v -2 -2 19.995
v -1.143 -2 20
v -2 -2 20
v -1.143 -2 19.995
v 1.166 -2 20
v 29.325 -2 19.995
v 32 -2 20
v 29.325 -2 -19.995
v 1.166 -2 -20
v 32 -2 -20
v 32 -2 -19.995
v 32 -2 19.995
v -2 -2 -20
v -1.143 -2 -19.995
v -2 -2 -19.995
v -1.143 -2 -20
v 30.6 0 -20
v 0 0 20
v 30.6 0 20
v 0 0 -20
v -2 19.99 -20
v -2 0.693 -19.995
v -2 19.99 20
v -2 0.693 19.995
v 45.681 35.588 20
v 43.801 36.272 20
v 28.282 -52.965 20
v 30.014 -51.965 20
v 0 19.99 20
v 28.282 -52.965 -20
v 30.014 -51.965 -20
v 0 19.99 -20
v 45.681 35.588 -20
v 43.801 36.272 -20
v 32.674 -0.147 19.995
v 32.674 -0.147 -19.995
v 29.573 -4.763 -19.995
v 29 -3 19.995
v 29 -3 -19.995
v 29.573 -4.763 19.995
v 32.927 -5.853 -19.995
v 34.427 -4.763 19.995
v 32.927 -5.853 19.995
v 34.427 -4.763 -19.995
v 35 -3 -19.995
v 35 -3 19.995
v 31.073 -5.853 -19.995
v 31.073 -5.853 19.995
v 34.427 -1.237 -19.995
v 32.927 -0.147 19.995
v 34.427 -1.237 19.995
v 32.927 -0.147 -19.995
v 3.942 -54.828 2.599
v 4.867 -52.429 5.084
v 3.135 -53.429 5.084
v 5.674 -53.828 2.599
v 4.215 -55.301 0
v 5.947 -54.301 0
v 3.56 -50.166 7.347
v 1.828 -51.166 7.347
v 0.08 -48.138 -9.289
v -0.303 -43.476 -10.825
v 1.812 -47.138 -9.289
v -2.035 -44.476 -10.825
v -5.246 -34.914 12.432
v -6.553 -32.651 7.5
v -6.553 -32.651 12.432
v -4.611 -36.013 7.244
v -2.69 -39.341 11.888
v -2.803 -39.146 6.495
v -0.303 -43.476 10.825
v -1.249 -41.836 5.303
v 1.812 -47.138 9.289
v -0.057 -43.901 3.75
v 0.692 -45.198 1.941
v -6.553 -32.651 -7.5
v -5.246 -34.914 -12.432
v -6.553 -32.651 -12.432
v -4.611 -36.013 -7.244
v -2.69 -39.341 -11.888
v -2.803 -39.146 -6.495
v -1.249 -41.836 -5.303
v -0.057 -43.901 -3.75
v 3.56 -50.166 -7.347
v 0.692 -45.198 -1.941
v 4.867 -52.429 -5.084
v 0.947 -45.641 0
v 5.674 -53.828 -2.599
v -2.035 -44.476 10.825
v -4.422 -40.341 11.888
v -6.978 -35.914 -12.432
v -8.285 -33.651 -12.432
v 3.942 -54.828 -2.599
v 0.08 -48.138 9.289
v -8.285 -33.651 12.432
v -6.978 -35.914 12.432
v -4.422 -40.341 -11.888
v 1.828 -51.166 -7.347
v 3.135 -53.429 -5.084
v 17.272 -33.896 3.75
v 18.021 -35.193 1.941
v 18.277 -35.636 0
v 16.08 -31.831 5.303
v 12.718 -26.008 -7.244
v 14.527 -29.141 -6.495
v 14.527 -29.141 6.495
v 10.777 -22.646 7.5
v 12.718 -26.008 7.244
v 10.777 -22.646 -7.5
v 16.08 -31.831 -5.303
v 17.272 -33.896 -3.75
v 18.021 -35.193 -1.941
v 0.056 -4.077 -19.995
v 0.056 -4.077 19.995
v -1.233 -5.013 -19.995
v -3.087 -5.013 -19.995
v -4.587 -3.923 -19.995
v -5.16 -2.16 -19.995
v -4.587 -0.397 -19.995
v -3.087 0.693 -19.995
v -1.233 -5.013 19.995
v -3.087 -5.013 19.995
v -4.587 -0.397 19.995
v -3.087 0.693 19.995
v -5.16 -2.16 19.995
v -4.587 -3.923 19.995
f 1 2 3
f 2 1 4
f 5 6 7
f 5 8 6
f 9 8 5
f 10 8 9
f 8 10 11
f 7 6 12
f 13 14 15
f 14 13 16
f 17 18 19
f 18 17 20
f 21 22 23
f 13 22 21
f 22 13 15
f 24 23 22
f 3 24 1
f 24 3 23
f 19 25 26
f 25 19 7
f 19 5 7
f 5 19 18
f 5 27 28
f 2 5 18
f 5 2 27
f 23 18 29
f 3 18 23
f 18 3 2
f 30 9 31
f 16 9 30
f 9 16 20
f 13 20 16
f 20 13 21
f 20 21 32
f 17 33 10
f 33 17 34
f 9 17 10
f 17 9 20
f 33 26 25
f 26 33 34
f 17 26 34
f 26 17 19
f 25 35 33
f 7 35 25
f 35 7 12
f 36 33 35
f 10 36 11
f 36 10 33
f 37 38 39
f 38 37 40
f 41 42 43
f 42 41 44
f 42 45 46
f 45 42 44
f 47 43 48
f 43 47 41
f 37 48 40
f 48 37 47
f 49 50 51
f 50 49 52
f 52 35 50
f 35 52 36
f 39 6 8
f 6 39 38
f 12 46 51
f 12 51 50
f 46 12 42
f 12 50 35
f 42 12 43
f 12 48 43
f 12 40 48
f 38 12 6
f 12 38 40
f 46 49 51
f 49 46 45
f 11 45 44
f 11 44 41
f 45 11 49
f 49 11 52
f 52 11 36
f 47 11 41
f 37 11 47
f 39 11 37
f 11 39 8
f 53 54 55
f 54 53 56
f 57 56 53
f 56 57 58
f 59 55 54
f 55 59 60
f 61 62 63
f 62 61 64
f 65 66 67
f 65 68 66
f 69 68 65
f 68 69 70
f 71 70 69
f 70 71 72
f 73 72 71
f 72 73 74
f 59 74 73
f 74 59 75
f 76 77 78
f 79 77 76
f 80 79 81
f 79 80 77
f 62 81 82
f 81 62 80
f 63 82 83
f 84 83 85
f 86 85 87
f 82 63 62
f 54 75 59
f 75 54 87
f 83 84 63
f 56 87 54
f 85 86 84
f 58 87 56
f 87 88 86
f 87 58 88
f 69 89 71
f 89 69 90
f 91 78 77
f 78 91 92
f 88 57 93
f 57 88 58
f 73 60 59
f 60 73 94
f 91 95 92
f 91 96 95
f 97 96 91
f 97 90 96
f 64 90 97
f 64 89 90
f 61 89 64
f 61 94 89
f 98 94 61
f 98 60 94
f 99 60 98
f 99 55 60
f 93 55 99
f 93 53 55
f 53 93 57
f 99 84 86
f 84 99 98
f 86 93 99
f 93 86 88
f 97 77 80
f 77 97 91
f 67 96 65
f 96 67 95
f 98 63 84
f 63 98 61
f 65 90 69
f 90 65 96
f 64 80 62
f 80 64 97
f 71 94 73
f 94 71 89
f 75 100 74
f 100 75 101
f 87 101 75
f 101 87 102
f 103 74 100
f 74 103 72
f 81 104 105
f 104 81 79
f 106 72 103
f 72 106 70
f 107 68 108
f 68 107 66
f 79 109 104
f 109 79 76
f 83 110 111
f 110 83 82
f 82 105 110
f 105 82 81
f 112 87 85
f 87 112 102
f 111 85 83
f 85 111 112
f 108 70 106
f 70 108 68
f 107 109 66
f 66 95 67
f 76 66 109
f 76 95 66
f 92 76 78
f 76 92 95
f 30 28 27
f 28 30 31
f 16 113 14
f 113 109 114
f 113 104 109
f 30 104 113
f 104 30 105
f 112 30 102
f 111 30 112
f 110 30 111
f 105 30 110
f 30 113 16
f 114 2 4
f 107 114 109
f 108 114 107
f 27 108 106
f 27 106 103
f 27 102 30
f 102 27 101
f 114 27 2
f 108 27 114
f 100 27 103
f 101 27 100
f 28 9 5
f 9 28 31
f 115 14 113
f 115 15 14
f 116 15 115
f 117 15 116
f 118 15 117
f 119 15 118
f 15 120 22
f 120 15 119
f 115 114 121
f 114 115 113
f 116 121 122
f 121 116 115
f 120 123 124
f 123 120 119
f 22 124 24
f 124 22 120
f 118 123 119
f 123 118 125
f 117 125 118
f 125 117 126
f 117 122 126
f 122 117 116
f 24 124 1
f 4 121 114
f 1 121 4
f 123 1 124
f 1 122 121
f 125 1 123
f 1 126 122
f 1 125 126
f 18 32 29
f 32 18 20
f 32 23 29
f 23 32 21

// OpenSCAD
// Glasses_perch
// Thing that lets you place your glasses on the top edge of your
// computer monitor
//
// David Palmer
// dmopalmer at gmail.com
// Distributed under GPL version 2
// <http://www.gnu.org/licenses/gpl-2.0.html>
//
// Designed to use customizer at thingiverse
// <http://www.makerbot.com/blog/2013/01/23/openscad-design-tips-how-to-make-a-customizable-thing/>

// Generate just a narrow test profile to ensure it fits your monitor
test_profile = 0; // [0: Full width, 1: Test profile]

// Thickness of the plastic in mm
thickness = 2.0;  // thickness

// Thickness of monitor at top edge (mm)
monitor_thickness = 30;

// Length of front leg
front_length = 20;

// Length of back leg
back_length = 40;

// Length of riser
riser_length = 60;

// slope of riser.  (Degrees: 90 means vertical)
riser_slope = 60;

// Monitor back wedge (degrees: 0 means back is perp. to top edge, >0 means it is slanted)
monitor_back_slope = 20;

// Monitor top wedge (degrees: >0 means that the top slopes way instead of being perpendicular to the screen)
monitor_top_wedge = 0;

// Width of the perch (mm).
width = 40;

// Nose width (mm).
nose_width = 10;

// Nose_depth
nose_depth = 20;

// Nose_height along riser
nose_height = 25;

// Nose_brim_rimwidth
nose_brim_rimwidth = 5;

// Radius of bead along joints
bead = 1.5 * thickness;

// epsilon to prevent problems with coincident planes
eps = 0.01;

module Nose()   // flat of cylinder is on the Y axis.
{
    nose_radius = nose_width/2 * 1.5;
    stretch = 2;
    scale([stretch,1,1]) {
        difference() {
            union() {
                translate([0,0,nose_depth+thickness]) cylinder(h = thickness, r=nose_radius+nose_brim_rimwidth);
                cylinder(h=thickness + nose_depth + 0.5*thickness, r=nose_radius);
            }
            translate([-50,0,0]) cube([100,100,100],center=true);
        }
    }
}

module Riser()
{
    rotate([0,-riser_slope,0]) {
        union() {
            translate([nose_height,0,0]) Nose();
            translate([eps,-width/2,-eps]) cube([riser_length, width,thickness],center=false);
        }
    }
}

module Perch() // Top level module
{
    rotate([90,0,0]) union() {
        // Front is in the xy plane
        translate([-bead*0.72,0,bead*0.72]) rotate([90,0,0]) cylinder(h=width-eps,r=bead,center=true);
        translate([-thickness,-width/2,-front_length+eps]) cube([thickness, width, front_length]);
        rotate([0,monitor_top_wedge,0]) {
            union(){
                translate([-thickness,-width/2,0]) cube([monitor_thickness + 2*thickness, width, thickness]);
                translate([monitor_thickness+thickness,-width/2,thickness])
                    rotate([0,180-monitor_back_slope-monitor_top_wedge,0])
                        cube([thickness,width,back_length]);
                translate([monitor_thickness+thickness,(width-eps)/2,bead])
                    rotate([90,0,0]) cylinder(h=width-eps,r=bead,center=false);
            }
        }
        Riser();
    }
}

module Profile()
{
    intersection() {
        Perch();
        cube([1000,1000,2],center=true);
    }
}
// Rotate it so that ends up on the printer bed in the right orientation

if (test_profile == 1) {
    Profile();
} else {
    Perch();
}
